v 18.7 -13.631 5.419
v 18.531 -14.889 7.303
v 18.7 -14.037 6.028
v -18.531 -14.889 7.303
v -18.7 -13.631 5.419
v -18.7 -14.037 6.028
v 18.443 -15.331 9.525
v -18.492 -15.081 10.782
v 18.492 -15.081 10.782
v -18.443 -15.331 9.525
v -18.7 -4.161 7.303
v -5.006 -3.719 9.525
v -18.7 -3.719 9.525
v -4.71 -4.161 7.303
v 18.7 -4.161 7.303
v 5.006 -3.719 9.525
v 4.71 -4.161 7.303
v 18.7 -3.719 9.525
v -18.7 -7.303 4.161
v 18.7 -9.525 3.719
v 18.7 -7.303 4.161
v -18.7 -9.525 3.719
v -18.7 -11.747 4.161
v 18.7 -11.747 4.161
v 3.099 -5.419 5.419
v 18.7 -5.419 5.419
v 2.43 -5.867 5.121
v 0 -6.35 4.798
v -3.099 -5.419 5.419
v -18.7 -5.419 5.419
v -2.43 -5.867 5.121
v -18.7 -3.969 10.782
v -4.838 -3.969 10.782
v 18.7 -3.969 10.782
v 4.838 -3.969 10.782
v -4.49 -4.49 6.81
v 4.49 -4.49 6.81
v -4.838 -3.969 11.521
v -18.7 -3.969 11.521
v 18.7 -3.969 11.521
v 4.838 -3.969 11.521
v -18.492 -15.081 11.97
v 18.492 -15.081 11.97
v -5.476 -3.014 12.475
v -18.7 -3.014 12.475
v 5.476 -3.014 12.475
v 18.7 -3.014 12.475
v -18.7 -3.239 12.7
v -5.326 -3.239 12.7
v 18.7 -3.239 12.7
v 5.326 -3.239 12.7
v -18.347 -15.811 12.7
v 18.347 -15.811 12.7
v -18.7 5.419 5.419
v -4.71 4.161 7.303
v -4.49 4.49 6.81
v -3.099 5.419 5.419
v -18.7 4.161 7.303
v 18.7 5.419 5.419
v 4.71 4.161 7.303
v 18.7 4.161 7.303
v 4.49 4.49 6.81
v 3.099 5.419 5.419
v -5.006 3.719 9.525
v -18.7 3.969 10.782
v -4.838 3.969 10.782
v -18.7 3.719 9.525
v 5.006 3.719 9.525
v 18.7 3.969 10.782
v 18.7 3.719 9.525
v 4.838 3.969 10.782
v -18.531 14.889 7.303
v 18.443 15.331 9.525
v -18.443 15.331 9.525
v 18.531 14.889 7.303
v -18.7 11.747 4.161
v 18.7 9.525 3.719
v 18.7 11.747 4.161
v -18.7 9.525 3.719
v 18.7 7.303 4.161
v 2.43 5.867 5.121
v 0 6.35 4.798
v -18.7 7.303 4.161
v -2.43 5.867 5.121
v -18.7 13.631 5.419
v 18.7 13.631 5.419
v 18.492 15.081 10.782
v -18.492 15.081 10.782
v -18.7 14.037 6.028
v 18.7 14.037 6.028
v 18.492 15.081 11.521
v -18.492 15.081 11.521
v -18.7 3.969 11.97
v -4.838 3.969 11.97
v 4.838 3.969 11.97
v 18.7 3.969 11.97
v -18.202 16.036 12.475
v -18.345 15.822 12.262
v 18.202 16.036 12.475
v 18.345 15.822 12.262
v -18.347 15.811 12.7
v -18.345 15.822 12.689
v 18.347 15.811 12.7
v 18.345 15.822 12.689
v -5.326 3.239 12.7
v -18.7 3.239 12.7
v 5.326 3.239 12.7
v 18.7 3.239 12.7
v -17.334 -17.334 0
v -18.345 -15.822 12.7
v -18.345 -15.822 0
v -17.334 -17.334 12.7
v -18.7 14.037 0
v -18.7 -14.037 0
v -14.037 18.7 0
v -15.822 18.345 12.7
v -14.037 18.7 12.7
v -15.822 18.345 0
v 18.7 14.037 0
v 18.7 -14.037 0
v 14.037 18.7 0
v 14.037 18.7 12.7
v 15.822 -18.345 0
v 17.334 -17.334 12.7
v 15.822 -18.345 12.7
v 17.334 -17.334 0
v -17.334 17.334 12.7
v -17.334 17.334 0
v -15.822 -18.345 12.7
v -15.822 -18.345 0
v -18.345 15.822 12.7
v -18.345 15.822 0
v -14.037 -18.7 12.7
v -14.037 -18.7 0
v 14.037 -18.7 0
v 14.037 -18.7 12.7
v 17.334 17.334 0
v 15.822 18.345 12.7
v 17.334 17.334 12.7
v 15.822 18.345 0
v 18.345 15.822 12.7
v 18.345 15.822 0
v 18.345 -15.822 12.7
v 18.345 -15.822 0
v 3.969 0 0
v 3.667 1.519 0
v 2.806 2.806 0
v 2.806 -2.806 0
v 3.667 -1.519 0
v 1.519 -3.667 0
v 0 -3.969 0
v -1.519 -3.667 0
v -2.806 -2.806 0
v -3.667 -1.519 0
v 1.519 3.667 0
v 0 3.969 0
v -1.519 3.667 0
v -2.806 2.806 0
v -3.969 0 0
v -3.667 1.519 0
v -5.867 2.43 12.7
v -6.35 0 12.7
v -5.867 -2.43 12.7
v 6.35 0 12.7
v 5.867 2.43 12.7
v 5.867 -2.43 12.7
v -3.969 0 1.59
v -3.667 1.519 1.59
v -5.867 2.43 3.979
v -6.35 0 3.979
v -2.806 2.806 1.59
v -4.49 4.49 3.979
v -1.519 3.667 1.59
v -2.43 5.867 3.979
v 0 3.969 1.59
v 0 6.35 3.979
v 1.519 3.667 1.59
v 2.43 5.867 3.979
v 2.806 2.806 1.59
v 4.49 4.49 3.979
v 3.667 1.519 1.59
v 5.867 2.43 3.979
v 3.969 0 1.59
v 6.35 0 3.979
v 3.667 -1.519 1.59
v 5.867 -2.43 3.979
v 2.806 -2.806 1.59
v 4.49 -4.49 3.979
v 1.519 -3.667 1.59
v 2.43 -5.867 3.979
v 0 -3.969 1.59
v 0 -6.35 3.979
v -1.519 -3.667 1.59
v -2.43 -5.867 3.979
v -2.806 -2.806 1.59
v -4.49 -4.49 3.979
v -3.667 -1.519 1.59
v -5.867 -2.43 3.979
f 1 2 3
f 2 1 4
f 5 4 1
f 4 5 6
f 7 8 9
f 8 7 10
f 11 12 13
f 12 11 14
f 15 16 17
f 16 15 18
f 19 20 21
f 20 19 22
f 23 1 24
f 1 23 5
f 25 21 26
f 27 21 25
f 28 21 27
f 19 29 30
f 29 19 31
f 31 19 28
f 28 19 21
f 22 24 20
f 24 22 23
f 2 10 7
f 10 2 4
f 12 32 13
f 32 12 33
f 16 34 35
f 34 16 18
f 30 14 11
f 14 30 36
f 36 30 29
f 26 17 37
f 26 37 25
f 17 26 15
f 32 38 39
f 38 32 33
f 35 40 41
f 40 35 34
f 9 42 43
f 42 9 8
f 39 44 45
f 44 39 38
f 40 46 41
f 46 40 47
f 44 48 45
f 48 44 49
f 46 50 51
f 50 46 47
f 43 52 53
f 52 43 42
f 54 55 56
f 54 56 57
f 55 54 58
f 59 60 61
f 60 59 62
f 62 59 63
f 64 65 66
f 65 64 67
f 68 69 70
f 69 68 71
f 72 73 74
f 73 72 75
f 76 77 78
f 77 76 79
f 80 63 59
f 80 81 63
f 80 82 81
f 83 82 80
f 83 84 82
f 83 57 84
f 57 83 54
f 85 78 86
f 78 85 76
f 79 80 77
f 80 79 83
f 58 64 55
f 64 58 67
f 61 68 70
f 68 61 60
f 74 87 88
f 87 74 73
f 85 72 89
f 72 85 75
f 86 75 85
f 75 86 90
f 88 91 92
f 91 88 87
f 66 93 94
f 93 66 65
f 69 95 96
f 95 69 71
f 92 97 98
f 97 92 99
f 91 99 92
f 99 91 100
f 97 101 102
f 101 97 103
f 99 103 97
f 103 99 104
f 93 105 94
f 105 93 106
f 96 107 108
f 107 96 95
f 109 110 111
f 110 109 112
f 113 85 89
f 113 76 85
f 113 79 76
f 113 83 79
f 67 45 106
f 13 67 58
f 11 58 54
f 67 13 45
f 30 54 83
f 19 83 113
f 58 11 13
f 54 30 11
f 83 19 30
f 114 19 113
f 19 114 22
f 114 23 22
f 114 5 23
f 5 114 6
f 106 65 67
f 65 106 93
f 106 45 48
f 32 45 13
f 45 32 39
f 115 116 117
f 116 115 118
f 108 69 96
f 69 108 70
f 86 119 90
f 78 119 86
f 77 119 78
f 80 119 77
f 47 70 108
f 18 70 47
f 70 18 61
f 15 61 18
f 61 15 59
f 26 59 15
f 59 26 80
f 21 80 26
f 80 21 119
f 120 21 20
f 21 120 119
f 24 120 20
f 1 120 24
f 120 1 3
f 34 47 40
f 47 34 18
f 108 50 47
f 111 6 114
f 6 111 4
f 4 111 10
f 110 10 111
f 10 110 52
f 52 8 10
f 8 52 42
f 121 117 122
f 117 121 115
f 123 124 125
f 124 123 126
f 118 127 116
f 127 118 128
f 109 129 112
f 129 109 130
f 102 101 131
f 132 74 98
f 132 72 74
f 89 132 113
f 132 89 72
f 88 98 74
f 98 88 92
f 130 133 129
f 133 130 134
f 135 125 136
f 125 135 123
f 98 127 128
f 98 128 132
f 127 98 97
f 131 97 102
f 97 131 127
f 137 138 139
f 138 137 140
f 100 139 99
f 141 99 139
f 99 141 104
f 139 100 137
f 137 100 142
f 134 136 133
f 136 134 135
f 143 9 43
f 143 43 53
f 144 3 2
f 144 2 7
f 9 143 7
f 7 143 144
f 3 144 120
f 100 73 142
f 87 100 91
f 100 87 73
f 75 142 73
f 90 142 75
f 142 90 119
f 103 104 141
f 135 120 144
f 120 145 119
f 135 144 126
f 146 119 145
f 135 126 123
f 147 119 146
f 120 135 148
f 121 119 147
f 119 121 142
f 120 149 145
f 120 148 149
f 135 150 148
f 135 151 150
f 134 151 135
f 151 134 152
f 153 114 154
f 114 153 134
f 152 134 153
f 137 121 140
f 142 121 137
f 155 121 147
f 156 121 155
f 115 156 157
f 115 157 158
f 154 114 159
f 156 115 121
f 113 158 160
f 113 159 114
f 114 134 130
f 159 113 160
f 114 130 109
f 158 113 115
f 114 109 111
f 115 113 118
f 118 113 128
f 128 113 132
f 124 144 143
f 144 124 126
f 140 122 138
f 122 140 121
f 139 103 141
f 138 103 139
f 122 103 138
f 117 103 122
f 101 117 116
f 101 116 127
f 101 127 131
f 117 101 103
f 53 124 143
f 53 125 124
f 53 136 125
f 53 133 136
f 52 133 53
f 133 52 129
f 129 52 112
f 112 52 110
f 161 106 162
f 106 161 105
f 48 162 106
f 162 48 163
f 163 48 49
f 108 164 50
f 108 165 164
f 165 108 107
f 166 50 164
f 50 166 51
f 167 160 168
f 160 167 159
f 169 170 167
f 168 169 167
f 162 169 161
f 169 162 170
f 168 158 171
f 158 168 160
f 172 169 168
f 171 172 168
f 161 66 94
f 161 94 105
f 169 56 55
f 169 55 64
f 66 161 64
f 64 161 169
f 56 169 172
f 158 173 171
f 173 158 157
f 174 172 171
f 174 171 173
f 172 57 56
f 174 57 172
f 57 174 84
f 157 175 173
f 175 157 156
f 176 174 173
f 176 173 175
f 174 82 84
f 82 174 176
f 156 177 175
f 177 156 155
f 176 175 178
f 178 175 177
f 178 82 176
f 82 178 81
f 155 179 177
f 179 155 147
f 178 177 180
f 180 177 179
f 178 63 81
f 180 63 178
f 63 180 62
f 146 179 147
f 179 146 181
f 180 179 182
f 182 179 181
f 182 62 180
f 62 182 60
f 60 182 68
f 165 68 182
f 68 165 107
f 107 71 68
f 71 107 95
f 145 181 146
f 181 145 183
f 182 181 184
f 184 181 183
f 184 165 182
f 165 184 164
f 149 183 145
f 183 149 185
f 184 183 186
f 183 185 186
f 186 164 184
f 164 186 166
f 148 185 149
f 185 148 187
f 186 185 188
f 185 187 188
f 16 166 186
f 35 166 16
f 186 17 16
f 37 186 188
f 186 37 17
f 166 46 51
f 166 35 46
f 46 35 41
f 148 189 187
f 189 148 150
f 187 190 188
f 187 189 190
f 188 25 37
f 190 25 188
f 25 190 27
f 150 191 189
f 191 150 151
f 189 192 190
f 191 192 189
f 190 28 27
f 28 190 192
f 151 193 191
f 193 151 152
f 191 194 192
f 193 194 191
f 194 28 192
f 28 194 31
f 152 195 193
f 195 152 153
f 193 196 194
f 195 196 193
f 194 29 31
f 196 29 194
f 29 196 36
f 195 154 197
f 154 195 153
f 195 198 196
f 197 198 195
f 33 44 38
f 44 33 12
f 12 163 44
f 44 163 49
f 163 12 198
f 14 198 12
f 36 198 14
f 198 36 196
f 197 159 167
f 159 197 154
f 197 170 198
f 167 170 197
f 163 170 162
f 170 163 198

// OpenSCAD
// file: ../lib/TOGHoleLib-v1.scad
// Library of hole shapes!
// Mostly to accommodate counterbored/countersunk screws.

module tog_holelib_countersunk_hole_2(surface_d, neck_d, head_h, depth, bore_d, overhead_bore_d, overhead_bore_height) {
	rotate_extrude() {
		union() {
			// Bore
			polygon([
				[     0  , -depth],
				[bore_d/2, -depth],
				[bore_d/2, -0.01],
				[     0  , -0.01],
			]);
			// Head and headbore
			polygon([
				[              0  ,               -head_h],
				[         neck_d/2,               -head_h],
				// Try to avoid points exactly at the surface:
				[      surface_d/2,                 0.01 ],
				[overhead_bore_d/2,                 0.01 ],
				[overhead_bore_d/2,  overhead_bore_height],
				[              0  ,  overhead_bore_height],
			]);
		}
	}
}

module tog_holelib_countersunk_hole(surface_d, neck_d, head_h, depth, bore_d=-1, overhead_bore_d=0, overhead_bore_height=1) {
	tog_holelib_countersunk_hole_2(surface_d, neck_d, head_h, depth, bore_d == -1 ? neck_d : bore_d, max(surface_d, overhead_bore_d), overhead_bore_height);
}

// Suitable for #6 flatheads
module tog_holelib_hole1001(depth, overhead_bore_height=1) {
	tog_holelib_countersunk_hole(8, 4, 2, depth, 5, 0, overhead_bore_height);
}

// Suitable for 1/4" flatheads
module tog_holelib_hole1002(depth, overhead_bore_height=1) {
	tog_holelib_countersunk_hole(1/2*inch, 1/4*inch, 1/8*inch, depth, 5/16*inch, 0, overhead_bore_height);
}

// Hole type names:
// 
// THL-1001: Countersunk hole for #6 machine screws or 6x sheet metal screws
// THL-1002: Countersunk hole for 1/4" flathead machine screws

module tog_holelib_hole(type_name, depth=1000, overhead_bore_height=1) {
	if( type_name == "THL-1001" ) {
		tog_holelib_hole1001(depth, overhead_bore_height);
	} else if( type_name == "THL-1002" ) {
		tog_holelib_hole1002(depth, overhead_bore_height);
	} else {
		assert(false, str("Unknown hole type: '", type_name, "'"));
	}
}
// main file
// MarkerHolder-v1.0
//
// Holder my paint sharpies, which are 7/16" wide according to my caliper

$fn = 16;

width = 38.1;
thickness = 12.7; // 19.05;
outer_margin = 0.25;
marker_diameter = 11.1125;
slot_depth = 3.175;

module __end_params() { }

include <../lib/TOGHoleLib-v1.scad>;

inch = 25.4;

module rounded_square(size, corner_radius, offset=0) {
	hull() for( ym=[-1,1] ) for( xm=[-1,1] ) {
		translate([
			xm*(size[0]/2-corner_radius),
			ym*(size[1]/2-corner_radius),
		]) circle(r=corner_radius+offset);
	}	
}

module marker_slot(depth) {
	translate([0,0,-depth]) rotate([0,90,0]) cylinder(d=7/16*inch+0.5, h=width+2, center=true);
	translate([0,0,0]) cube([width, marker_diameter, depth*2], center=true);
	translate([0,0,0]) rotate([45,0,0]) cube([width, marker_diameter/1.25, 6/16*inch], center=true);
}

module marker_holder_hull() {
	linear_extrude(thickness) {
		rounded_square([1.5*inch-outer_margin*2, 1.5*inch-outer_margin*2], 3/16*inch, -0.1);
	}
}

module marker_holder() {
	difference() {
		marker_holder_hull();
		translate([0,-3/8*inch,thickness]) marker_slot(slot_depth);
		translate([0,+3/8*inch,thickness]) marker_slot(slot_depth);
		translate([0,0,5/32*inch]) tog_holelib_hole("THL-1002", thickness, overhead_bore_height=thickness);
	}
}

marker_holder();
